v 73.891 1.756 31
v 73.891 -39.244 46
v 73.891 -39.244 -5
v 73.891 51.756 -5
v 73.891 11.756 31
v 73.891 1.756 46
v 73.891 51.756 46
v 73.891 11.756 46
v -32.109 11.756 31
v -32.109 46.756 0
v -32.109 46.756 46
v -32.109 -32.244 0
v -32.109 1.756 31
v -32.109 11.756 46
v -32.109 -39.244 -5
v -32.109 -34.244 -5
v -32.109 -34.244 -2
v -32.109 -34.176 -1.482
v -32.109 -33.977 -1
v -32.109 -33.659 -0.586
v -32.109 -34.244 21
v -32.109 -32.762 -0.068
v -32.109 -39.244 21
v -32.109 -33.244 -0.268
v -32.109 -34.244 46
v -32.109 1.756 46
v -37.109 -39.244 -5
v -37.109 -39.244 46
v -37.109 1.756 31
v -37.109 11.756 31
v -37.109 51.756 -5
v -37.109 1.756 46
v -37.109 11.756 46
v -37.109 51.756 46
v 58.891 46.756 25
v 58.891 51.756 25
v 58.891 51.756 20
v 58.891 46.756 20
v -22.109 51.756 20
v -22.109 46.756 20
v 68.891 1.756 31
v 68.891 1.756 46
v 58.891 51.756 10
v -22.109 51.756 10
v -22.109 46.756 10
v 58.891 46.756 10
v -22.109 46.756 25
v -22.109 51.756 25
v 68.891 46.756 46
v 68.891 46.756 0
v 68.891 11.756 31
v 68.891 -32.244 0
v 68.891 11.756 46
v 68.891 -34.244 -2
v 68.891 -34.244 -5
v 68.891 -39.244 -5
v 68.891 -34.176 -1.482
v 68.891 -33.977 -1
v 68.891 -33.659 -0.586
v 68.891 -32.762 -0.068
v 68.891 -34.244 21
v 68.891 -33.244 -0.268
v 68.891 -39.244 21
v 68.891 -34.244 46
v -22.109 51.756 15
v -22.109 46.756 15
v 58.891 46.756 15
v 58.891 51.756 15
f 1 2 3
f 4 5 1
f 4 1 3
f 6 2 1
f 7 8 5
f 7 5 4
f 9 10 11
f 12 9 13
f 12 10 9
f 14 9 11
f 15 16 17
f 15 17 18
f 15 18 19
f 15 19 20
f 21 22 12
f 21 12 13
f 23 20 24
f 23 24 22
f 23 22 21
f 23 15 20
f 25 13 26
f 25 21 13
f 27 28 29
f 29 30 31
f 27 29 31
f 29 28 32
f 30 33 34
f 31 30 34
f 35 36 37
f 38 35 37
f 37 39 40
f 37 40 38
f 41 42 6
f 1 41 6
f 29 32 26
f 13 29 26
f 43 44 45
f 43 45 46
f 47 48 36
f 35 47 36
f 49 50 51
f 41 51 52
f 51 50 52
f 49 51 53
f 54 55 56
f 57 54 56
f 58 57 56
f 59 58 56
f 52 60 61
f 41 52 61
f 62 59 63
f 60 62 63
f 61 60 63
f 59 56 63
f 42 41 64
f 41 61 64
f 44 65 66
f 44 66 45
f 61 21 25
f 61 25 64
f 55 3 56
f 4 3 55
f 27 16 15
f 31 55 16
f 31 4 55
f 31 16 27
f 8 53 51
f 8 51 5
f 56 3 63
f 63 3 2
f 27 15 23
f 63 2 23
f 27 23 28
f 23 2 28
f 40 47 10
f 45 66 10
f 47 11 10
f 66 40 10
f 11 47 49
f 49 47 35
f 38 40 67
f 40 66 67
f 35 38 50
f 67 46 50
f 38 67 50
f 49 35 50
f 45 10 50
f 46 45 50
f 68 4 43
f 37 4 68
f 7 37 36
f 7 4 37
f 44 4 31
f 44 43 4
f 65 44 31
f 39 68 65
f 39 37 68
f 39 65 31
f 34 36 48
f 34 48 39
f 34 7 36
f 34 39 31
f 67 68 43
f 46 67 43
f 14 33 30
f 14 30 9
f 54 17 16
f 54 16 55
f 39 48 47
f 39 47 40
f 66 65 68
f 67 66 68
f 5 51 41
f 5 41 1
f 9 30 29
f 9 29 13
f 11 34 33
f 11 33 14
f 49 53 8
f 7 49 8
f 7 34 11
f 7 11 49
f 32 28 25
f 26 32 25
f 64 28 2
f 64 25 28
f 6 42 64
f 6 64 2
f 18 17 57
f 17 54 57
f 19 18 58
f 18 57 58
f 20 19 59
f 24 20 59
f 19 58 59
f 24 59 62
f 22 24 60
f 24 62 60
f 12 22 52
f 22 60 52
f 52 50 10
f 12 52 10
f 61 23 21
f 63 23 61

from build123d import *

# Parameters (mm, degrees)
SKETCH_1_W          = 111
SKETCH_1_H          = 91
SKETCH_1_W_2        = 101
SKETCH_1_H_2        = 81
EXTRUDE_1_DEPTH     = 46
SKETCH_2_W          = 111
SKETCH_2_H          = 91
EXTRUDE_2_DEPTH     = 5
SKETCH_3_W          = 101
SKETCH_3_H          = 26
CUT_EXTRUDE_1_DEPTH = 5
FILLET_1_R          = 2
SKETCH_4_W          = 5
SKETCH_4_H          = 10
CUT_EXTRUDE_2_DEPTH = 15
SKETCH_5_W          = 81
SKETCH_5_H          = 5
CUT_EXTRUDE_3_DEPTH = 5


with BuildPart() as part:
    # 草圖1 → 填料-伸長1 (new body)
    with BuildSketch(Plane.XY):
        with Locations((18.39111128, 6.255540432)):
            Rectangle(SKETCH_1_W, SKETCH_1_H)
        with Locations((18.39111128, 6.255540432)):
            Rectangle(SKETCH_1_W_2, SKETCH_1_H_2, mode=Mode.SUBTRACT)
    extrude(amount=EXTRUDE_1_DEPTH)

    # 草圖2 → 填料-伸長2 (add)
    with BuildSketch(Plane(origin=(0, 0, 0), x_dir=(-1, 0, 0), z_dir=(0, 0, -1))):
        with Locations((-18.39111128, 6.255540432)):
            Rectangle(SKETCH_2_W, SKETCH_2_H)
    extrude(amount=EXTRUDE_2_DEPTH)

    # 草圖3 → 除料-伸長1 (cut)
    with BuildSketch(Plane.XZ.offset(39.244459568)):
        with Locations((18.39111128, 8)):
            Rectangle(SKETCH_3_W, SKETCH_3_H)
    extrude(amount=-CUT_EXTRUDE_1_DEPTH, mode=Mode.SUBTRACT)

    # 圓角1
    fillet_1_edges = [part.edges().sort_by_distance(p)[0] for p in [
        (18.39111128, -34.244459568, 0),
    ]]
    fillet(fillet_1_edges, radius=FILLET_1_R)

    # 草圖4 → 除料-伸長2 (cut)
    with BuildSketch(Plane.XY.offset(46)):
        with Locations((-34.60888872, 6.755540432)):
            Rectangle(SKETCH_4_W, SKETCH_4_H)
        with Locations((71.39111128, 6.755540432)):
            Rectangle(SKETCH_4_W, SKETCH_4_H)
    extrude(amount=-CUT_EXTRUDE_2_DEPTH, mode=Mode.SUBTRACT)

    # 草圖5 → 除料-伸長3 (cut)
    with BuildSketch(Plane(origin=(0, 51.755540432, 0), x_dir=(1, 0, 0), z_dir=(0, 1, 0))):
        with Locations((18.39111128, -22.5)):
            Rectangle(SKETCH_5_W, SKETCH_5_H)
        with Locations((18.39111128, -12.5)):
            Rectangle(SKETCH_5_W, SKETCH_5_H)
    extrude(amount=-CUT_EXTRUDE_3_DEPTH, mode=Mode.SUBTRACT)


solid = part.part
